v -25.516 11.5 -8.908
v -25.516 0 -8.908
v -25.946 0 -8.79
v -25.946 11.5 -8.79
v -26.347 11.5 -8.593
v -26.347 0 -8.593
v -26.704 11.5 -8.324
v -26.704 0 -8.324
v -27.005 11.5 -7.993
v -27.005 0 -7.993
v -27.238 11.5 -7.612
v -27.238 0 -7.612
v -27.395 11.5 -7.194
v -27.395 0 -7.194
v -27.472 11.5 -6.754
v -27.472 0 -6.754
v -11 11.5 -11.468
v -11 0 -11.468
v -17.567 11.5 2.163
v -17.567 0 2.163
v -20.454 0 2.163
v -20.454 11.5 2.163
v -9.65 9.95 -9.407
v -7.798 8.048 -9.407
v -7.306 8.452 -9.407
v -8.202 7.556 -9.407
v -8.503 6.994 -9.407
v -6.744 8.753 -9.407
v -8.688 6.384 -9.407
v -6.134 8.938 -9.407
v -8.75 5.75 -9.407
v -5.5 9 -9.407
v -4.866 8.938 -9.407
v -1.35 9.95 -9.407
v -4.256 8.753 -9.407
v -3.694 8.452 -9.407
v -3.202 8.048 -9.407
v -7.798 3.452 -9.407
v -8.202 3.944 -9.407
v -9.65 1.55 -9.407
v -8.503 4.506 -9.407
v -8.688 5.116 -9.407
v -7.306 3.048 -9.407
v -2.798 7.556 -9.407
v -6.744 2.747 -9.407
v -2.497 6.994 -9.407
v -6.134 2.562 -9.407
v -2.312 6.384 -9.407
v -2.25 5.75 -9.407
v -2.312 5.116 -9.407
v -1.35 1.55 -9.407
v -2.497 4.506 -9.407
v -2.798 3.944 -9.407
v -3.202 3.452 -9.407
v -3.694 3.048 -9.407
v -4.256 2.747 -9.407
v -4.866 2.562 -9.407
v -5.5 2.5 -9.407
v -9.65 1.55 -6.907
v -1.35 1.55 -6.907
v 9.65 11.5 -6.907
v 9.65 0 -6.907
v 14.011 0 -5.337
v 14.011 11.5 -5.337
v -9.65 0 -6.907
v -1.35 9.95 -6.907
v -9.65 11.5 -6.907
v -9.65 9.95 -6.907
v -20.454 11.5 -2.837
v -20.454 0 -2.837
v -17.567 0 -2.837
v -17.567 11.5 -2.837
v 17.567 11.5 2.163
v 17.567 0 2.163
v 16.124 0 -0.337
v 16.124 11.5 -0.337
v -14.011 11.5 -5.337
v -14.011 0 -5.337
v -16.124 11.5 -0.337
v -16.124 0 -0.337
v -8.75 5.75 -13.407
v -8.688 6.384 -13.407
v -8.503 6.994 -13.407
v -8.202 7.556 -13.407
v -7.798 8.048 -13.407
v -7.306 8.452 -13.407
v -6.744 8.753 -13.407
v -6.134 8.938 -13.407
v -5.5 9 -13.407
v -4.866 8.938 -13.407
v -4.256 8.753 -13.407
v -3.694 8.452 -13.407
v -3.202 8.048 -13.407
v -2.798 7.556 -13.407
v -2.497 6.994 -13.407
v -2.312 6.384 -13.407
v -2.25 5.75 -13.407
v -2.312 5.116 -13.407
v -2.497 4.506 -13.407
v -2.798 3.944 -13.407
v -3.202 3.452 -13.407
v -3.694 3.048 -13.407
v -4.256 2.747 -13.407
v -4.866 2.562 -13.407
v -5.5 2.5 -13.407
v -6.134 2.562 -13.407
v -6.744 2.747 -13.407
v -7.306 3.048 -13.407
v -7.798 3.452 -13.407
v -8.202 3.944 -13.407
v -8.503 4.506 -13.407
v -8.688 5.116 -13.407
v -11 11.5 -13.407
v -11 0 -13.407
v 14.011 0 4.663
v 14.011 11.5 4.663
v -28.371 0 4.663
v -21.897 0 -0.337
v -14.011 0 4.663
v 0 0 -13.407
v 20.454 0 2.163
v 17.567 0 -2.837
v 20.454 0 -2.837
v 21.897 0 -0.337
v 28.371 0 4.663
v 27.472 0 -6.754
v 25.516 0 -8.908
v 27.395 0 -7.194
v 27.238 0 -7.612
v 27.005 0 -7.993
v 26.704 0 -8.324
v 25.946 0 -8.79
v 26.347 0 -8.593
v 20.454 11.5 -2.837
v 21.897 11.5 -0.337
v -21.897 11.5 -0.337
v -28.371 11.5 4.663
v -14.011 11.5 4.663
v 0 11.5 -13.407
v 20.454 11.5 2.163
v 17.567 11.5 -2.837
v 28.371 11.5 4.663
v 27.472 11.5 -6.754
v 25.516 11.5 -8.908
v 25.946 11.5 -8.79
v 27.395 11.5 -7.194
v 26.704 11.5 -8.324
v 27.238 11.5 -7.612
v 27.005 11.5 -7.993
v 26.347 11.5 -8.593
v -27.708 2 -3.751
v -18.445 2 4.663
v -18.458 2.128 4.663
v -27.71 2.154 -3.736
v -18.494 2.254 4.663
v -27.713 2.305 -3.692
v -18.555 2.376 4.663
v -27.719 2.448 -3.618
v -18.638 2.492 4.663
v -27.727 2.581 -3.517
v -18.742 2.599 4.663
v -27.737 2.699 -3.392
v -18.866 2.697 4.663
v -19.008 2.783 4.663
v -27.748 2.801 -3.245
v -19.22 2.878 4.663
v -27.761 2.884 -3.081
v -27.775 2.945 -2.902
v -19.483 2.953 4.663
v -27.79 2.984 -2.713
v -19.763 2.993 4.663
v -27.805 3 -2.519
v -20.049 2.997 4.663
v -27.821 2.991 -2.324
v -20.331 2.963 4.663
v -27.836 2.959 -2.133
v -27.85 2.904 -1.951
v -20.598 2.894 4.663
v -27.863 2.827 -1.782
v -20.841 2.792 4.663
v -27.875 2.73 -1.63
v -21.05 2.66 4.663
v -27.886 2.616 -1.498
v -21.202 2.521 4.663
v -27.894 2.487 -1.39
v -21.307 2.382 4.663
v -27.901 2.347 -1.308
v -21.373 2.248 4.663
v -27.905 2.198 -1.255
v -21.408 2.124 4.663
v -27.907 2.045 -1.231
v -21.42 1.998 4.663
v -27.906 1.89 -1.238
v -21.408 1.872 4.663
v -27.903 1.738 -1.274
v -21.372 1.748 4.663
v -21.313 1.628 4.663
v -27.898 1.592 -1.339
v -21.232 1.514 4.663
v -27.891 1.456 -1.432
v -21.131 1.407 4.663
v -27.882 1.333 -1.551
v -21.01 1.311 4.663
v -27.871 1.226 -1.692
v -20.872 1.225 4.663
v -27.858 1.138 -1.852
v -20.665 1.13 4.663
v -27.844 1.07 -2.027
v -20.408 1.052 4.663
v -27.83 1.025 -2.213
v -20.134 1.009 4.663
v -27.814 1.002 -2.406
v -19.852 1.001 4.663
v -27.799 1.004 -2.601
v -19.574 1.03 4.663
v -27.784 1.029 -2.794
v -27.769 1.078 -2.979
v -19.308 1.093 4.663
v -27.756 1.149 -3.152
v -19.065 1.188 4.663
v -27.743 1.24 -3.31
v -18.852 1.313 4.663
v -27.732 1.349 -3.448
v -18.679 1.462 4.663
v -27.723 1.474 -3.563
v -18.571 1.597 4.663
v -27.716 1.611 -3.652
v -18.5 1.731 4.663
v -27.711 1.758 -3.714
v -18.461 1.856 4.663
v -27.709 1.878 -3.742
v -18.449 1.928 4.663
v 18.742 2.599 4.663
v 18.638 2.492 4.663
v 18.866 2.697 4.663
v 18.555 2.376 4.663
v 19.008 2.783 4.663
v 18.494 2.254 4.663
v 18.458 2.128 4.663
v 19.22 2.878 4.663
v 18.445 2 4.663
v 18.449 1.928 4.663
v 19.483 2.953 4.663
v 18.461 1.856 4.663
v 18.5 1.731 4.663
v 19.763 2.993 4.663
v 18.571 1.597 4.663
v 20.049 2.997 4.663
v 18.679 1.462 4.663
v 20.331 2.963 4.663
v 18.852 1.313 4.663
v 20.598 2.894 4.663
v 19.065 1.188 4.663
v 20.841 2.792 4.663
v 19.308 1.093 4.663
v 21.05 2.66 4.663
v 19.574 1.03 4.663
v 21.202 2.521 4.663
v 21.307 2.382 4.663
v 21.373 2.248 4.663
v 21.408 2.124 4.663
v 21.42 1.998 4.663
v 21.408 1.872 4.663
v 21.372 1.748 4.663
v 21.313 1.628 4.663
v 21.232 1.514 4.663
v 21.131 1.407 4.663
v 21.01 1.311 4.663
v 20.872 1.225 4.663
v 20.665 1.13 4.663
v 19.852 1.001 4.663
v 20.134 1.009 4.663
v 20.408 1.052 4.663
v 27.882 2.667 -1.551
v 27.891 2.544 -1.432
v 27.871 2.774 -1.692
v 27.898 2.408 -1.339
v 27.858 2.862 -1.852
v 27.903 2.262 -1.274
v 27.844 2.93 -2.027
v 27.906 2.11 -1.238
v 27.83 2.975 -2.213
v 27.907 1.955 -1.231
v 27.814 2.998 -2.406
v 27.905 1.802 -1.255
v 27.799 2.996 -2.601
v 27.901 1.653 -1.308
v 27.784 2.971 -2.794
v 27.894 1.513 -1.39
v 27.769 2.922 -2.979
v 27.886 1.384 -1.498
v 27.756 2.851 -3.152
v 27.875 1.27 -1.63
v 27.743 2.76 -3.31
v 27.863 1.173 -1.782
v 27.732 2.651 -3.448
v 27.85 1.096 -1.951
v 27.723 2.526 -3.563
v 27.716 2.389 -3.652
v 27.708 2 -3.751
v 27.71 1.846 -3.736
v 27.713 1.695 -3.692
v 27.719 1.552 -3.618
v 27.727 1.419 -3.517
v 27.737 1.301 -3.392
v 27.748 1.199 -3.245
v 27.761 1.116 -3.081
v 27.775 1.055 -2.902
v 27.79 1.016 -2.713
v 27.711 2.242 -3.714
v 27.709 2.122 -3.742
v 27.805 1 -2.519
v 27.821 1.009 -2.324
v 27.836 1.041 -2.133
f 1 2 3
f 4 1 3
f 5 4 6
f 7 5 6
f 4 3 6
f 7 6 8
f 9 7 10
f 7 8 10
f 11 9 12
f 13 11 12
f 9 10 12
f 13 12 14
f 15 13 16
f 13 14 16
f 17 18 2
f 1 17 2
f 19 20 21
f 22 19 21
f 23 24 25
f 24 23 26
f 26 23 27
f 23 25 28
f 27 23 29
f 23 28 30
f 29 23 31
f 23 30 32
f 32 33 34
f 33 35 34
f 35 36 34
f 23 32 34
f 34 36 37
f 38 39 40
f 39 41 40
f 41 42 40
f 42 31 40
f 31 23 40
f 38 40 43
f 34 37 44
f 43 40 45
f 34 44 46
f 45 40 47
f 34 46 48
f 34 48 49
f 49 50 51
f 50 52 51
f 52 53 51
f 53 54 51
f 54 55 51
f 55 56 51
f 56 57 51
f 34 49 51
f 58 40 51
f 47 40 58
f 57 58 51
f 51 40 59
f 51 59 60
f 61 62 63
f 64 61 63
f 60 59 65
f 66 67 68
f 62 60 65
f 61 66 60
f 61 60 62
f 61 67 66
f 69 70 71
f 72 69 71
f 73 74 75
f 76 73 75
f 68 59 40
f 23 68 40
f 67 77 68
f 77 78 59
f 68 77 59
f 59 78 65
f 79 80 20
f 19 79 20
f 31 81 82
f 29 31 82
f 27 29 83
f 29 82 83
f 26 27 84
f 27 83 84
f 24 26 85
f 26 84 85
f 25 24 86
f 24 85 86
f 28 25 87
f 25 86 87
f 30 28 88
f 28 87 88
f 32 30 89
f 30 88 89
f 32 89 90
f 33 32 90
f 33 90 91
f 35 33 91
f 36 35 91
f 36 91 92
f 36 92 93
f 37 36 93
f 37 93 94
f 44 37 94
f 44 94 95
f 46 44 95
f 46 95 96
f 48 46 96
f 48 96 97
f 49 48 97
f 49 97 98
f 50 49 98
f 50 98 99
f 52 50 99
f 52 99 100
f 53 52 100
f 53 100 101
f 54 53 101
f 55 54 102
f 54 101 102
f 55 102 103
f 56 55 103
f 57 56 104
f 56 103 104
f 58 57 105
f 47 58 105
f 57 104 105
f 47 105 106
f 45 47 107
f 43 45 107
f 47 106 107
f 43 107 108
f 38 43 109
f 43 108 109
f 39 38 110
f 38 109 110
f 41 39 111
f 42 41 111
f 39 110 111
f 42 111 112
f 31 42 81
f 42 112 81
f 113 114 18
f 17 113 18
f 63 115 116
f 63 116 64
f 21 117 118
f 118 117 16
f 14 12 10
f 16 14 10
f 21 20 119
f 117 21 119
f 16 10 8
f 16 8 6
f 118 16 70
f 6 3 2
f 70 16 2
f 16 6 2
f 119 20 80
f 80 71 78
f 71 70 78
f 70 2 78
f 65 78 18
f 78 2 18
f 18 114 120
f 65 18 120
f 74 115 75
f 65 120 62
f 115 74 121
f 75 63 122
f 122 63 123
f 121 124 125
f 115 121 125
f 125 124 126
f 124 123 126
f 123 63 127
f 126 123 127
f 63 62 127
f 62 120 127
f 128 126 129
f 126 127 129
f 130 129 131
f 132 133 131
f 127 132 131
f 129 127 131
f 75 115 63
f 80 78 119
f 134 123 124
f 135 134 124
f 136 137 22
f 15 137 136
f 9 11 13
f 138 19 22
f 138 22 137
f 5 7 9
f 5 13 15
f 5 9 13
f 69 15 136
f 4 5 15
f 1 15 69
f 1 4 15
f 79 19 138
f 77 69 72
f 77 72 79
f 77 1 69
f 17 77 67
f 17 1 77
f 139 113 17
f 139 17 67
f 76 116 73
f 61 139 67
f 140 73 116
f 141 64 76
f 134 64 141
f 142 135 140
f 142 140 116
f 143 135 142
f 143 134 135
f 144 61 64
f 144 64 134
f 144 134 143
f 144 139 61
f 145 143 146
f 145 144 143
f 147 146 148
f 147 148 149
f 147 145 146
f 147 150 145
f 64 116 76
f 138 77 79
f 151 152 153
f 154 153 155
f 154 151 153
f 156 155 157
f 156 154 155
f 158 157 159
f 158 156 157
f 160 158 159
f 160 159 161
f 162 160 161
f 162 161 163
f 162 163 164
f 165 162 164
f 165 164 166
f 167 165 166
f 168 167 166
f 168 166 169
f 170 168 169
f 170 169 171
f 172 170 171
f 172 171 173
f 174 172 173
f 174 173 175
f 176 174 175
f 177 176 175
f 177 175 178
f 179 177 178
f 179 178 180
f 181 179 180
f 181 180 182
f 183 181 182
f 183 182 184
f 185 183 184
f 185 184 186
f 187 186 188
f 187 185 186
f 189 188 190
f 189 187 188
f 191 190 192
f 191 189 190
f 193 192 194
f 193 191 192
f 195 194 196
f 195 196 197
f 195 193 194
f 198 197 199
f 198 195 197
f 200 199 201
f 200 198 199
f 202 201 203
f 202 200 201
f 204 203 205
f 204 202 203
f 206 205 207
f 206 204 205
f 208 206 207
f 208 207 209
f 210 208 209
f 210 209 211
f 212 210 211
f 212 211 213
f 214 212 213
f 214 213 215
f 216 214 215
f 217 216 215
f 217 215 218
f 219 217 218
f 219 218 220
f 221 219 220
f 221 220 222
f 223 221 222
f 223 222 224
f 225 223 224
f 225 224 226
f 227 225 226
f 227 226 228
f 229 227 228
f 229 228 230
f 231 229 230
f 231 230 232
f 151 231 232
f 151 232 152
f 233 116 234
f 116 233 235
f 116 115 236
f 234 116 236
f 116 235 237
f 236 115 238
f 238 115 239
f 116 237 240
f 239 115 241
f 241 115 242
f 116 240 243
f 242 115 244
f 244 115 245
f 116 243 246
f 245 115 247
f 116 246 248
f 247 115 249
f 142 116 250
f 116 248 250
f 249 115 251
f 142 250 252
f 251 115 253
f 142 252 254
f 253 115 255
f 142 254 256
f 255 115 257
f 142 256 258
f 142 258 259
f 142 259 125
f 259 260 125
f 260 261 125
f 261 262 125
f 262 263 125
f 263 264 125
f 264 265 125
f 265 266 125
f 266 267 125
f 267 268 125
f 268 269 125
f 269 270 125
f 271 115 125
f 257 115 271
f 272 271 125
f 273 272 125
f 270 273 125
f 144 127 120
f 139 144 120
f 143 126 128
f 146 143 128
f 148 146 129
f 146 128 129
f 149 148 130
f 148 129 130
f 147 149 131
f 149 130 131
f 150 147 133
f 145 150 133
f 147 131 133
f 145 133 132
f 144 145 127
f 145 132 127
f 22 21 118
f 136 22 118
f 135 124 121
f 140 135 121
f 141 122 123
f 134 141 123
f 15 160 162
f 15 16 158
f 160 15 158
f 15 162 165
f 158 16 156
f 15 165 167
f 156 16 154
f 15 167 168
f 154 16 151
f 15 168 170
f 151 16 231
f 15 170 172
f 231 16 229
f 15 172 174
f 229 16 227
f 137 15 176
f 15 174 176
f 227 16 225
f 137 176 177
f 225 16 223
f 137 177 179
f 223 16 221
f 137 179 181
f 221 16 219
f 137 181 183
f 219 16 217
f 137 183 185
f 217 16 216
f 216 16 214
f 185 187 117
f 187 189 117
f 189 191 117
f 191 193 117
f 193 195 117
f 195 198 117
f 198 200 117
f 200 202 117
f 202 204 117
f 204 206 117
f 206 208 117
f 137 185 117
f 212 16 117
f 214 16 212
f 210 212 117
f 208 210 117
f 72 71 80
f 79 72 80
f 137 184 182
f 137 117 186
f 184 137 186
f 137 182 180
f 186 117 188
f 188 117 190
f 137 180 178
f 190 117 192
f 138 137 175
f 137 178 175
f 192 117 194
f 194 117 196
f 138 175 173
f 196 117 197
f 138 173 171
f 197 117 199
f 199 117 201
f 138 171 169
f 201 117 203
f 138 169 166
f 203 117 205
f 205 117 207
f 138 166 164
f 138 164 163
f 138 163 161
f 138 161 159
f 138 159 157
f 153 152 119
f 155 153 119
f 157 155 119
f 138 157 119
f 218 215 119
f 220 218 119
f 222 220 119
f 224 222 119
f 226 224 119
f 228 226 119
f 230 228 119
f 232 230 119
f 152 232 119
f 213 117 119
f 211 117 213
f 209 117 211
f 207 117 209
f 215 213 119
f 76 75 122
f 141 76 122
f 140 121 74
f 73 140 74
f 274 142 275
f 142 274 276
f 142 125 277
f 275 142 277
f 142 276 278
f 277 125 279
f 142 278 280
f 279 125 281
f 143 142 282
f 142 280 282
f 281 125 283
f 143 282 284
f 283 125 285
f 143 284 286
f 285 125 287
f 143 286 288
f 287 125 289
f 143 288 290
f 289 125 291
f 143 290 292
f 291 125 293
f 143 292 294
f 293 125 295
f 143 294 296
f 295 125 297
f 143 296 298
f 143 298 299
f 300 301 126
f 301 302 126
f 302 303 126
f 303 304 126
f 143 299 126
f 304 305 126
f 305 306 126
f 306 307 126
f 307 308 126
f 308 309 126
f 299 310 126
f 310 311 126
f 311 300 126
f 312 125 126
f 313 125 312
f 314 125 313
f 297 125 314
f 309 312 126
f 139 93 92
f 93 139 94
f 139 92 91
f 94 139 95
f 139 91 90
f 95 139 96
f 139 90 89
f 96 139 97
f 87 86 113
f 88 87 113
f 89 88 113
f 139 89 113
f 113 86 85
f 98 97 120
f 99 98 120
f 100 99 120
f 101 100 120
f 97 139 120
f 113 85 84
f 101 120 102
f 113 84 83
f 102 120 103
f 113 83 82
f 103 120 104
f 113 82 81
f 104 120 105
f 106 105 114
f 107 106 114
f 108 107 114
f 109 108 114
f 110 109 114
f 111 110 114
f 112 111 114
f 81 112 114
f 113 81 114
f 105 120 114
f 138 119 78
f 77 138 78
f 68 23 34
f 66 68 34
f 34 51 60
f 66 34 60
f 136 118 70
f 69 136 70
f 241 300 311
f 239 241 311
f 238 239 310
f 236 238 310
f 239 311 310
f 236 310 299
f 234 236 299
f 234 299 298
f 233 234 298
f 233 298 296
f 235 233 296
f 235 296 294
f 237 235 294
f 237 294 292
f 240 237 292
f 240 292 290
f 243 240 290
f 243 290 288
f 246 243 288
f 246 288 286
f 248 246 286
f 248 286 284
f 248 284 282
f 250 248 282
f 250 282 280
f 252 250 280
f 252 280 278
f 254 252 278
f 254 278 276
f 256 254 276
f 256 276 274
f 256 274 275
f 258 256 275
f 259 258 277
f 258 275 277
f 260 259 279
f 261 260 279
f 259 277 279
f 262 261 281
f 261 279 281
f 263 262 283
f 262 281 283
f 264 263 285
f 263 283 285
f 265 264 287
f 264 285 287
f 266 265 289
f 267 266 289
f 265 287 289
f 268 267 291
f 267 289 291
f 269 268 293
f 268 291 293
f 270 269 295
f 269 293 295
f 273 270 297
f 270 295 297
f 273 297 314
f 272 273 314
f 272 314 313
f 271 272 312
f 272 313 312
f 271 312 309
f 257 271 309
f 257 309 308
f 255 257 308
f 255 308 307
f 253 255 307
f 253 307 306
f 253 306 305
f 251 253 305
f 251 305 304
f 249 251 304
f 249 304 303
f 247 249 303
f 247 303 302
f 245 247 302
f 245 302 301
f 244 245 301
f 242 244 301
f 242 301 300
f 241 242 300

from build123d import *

# Parameters (mm, degrees)
SKETCH1_W           = 10
SKETCH1_H           = 10
BOSS_EXTRUDE1_DEPTH = 11.5
CUT_EXTRUDE1_REACH  = 37.548
SKETCH2_R           = 3.25
SKETCH3_W           = 8.3
SKETCH3_H           = 1.55
BOSS_EXTRUDE2_DEPTH = 2.5
CUT_EXTRUDE2_REACH  = 55.761
SKETCH4_R           = 1


with BuildPart() as part:
    # Sketch1 → Boss-Extrude1 (new body)
    # profile 1 of 4: a face of its own
    with BuildSketch(Plane(origin=(0, 0, 0), x_dir=(1, 0, 0), z_dir=(0, 1, 0))):
        with BuildLine():
            Line((-27.472148501, 6.754381863), (-28.370678518, -4.662524505))
            Line((-28.370678518, -4.662524505), (-24.01063487, -4.662524505))
            Line((-24.01063487, -4.662524505), (-24.01063487, 5.337475495))
            Line((-24.01063487, 5.337475495), (-14.01063487, 5.337475495))
            Line((-14.01063487, 5.337475495), (-9.65, 6.907286969))
            Line((-9.65, 6.907286969), (-9.65, 9.407286969))
            Line((-9.65, 9.407286969), (-1.35, 9.407286969))
            Line((-1.35, 9.407286969), (-1.35, 6.907286969))
            Line((-1.35, 6.907286969), (9.65, 6.907286969))
            Line((9.65, 6.907286969), (14.01063487, 5.337475495))
            Line((14.01063487, 5.337475495), (24.01063487, 5.337475495))
            Line((24.01063487, 5.337475495), (24.01063487, -4.662524505))
            Line((24.01063487, -4.662524505), (28.370678518, -4.662524505))
            Line((28.370678518, -4.662524505), (27.472148501, 6.754381863))
            ThreePointArc((27.472148501, 6.754381863), (26.86214664, 8.165702195), (25.515789835, 8.908164787))
            Line((25.515789835, 8.908164787), (0, 13.407286969))
            Line((0, 13.407286969), (-11, 11.467690181))
            Line((-11, 11.467690181), (-25.515789835, 8.908164787))
            ThreePointArc((-25.515789835, 8.908164787), (-26.86214664, 8.165702195), (-27.472148501, 6.754381863))
        make_face()
    # profile 2 of 4: a face of its own
    with BuildSketch(Plane(origin=(0, 0, 0), x_dir=(1, 0, 0), z_dir=(0, 1, 0))):
        with Locations((-19.01063487, 0.337475495)):
            Rectangle(SKETCH1_W, SKETCH1_H)
        Polygon((-17.567259197, 2.837475495), (-16.123883525, 0.337475495), (-17.567259197, -2.162524505), (-20.454010543, -2.162524505), (-21.897386216, 0.337475495), (-20.454010543, 2.837475495), align=None, mode=Mode.SUBTRACT)
    # profile 3 of 4: a face of its own
    with BuildSketch(Plane(origin=(0, 0, 0), x_dir=(1, 0, 0), z_dir=(0, 1, 0))):
        Polygon((-11, 13.407286969), (-11, 11.467690181), (0, 13.407286969), align=None)
    # profile 4 of 4: a face of its own
    with BuildSketch(Plane(origin=(0, 0, 0), x_dir=(1, 0, 0), z_dir=(0, 1, 0))):
        with Locations((19.01063487, 0.337475495)):
            Rectangle(SKETCH1_W, SKETCH1_H)
        Polygon((20.454010543, 2.837475495), (21.897386216, 0.337475495), (20.454010543, -2.162524505), (17.567259197, -2.162524505), (16.123883525, 0.337475495), (17.567259197, 2.837475495), align=None, mode=Mode.SUBTRACT)
    extrude(amount=BOSS_EXTRUDE1_DEPTH)

    # Sketch2 → Cut-Extrude1 (cut, up to next)
    with BuildSketch(Plane(origin=(0, 0, -13.407286969), x_dir=(-1, 0, 0), z_dir=(0, 0, -1)), mode=Mode.PRIVATE) as cut_extrude1_sk1:
        with Locations((5.5, 5.75)):
            Circle(SKETCH2_R)
    cut_extrude1_tool1 = extrude(cut_extrude1_sk1.sketch, amount=-CUT_EXTRUDE1_REACH, mode=Mode.PRIVATE) & part.part
    add(cut_extrude1_tool1.solids().sort_by_distance((-5.5, 5.75, -13.407287))[0], mode=Mode.SUBTRACT)

    # Sketch3 → Boss-Extrude2 (add)
    with BuildSketch(Plane.XY.offset(-9.407286969)):
        with Locations((-5.5, 10.725)):
            Rectangle(SKETCH3_W, SKETCH3_H)
        with Locations((-5.5, 0.775)):
            Rectangle(SKETCH3_W, SKETCH3_H)
    extrude(amount=BOSS_EXTRUDE2_DEPTH)

    # Cut-Extrude2: up to this plane
    cut_extrude2_end = Plane(origin=(0, 11.5, 4.662524505), z_dir=(0, 0, -1))
    # Sketch4 → Cut-Extrude2 (cut, up to the surface)
    with BuildSketch(Plane(origin=(19.248080096, 0, -17.483724977), x_dir=(-0.6723668074346677, 0, -0.7402181274868325), z_dir=(0.7402181274868325, 0, -0.6723668074346677)), mode=Mode.PRIVATE) as cut_extrude2_sk1:
        with Locations((-16.853337608, 2)):
            Circle(SKETCH4_R)
    cut_extrude2_tool1 = split(extrude(cut_extrude2_sk1.sketch, amount=-CUT_EXTRUDE2_REACH, mode=Mode.PRIVATE), bisect_by=cut_extrude2_end, keep=Keep.BOTH, mode=Mode.PRIVATE)
    cut_extrude2 = cut_extrude2_tool1.solids().sort_by_distance((30.579705, 2, -5.008579))[0]
    add(cut_extrude2, mode=Mode.SUBTRACT)

    # Mirror1: Cut-Extrude2 across plane
    add(cut_extrude2.mirror(Plane(origin=(0, 0, 0), x_dir=(0, 0, 1), z_dir=(1, 0, 0))), mode=Mode.SUBTRACT)


solid = part.part
